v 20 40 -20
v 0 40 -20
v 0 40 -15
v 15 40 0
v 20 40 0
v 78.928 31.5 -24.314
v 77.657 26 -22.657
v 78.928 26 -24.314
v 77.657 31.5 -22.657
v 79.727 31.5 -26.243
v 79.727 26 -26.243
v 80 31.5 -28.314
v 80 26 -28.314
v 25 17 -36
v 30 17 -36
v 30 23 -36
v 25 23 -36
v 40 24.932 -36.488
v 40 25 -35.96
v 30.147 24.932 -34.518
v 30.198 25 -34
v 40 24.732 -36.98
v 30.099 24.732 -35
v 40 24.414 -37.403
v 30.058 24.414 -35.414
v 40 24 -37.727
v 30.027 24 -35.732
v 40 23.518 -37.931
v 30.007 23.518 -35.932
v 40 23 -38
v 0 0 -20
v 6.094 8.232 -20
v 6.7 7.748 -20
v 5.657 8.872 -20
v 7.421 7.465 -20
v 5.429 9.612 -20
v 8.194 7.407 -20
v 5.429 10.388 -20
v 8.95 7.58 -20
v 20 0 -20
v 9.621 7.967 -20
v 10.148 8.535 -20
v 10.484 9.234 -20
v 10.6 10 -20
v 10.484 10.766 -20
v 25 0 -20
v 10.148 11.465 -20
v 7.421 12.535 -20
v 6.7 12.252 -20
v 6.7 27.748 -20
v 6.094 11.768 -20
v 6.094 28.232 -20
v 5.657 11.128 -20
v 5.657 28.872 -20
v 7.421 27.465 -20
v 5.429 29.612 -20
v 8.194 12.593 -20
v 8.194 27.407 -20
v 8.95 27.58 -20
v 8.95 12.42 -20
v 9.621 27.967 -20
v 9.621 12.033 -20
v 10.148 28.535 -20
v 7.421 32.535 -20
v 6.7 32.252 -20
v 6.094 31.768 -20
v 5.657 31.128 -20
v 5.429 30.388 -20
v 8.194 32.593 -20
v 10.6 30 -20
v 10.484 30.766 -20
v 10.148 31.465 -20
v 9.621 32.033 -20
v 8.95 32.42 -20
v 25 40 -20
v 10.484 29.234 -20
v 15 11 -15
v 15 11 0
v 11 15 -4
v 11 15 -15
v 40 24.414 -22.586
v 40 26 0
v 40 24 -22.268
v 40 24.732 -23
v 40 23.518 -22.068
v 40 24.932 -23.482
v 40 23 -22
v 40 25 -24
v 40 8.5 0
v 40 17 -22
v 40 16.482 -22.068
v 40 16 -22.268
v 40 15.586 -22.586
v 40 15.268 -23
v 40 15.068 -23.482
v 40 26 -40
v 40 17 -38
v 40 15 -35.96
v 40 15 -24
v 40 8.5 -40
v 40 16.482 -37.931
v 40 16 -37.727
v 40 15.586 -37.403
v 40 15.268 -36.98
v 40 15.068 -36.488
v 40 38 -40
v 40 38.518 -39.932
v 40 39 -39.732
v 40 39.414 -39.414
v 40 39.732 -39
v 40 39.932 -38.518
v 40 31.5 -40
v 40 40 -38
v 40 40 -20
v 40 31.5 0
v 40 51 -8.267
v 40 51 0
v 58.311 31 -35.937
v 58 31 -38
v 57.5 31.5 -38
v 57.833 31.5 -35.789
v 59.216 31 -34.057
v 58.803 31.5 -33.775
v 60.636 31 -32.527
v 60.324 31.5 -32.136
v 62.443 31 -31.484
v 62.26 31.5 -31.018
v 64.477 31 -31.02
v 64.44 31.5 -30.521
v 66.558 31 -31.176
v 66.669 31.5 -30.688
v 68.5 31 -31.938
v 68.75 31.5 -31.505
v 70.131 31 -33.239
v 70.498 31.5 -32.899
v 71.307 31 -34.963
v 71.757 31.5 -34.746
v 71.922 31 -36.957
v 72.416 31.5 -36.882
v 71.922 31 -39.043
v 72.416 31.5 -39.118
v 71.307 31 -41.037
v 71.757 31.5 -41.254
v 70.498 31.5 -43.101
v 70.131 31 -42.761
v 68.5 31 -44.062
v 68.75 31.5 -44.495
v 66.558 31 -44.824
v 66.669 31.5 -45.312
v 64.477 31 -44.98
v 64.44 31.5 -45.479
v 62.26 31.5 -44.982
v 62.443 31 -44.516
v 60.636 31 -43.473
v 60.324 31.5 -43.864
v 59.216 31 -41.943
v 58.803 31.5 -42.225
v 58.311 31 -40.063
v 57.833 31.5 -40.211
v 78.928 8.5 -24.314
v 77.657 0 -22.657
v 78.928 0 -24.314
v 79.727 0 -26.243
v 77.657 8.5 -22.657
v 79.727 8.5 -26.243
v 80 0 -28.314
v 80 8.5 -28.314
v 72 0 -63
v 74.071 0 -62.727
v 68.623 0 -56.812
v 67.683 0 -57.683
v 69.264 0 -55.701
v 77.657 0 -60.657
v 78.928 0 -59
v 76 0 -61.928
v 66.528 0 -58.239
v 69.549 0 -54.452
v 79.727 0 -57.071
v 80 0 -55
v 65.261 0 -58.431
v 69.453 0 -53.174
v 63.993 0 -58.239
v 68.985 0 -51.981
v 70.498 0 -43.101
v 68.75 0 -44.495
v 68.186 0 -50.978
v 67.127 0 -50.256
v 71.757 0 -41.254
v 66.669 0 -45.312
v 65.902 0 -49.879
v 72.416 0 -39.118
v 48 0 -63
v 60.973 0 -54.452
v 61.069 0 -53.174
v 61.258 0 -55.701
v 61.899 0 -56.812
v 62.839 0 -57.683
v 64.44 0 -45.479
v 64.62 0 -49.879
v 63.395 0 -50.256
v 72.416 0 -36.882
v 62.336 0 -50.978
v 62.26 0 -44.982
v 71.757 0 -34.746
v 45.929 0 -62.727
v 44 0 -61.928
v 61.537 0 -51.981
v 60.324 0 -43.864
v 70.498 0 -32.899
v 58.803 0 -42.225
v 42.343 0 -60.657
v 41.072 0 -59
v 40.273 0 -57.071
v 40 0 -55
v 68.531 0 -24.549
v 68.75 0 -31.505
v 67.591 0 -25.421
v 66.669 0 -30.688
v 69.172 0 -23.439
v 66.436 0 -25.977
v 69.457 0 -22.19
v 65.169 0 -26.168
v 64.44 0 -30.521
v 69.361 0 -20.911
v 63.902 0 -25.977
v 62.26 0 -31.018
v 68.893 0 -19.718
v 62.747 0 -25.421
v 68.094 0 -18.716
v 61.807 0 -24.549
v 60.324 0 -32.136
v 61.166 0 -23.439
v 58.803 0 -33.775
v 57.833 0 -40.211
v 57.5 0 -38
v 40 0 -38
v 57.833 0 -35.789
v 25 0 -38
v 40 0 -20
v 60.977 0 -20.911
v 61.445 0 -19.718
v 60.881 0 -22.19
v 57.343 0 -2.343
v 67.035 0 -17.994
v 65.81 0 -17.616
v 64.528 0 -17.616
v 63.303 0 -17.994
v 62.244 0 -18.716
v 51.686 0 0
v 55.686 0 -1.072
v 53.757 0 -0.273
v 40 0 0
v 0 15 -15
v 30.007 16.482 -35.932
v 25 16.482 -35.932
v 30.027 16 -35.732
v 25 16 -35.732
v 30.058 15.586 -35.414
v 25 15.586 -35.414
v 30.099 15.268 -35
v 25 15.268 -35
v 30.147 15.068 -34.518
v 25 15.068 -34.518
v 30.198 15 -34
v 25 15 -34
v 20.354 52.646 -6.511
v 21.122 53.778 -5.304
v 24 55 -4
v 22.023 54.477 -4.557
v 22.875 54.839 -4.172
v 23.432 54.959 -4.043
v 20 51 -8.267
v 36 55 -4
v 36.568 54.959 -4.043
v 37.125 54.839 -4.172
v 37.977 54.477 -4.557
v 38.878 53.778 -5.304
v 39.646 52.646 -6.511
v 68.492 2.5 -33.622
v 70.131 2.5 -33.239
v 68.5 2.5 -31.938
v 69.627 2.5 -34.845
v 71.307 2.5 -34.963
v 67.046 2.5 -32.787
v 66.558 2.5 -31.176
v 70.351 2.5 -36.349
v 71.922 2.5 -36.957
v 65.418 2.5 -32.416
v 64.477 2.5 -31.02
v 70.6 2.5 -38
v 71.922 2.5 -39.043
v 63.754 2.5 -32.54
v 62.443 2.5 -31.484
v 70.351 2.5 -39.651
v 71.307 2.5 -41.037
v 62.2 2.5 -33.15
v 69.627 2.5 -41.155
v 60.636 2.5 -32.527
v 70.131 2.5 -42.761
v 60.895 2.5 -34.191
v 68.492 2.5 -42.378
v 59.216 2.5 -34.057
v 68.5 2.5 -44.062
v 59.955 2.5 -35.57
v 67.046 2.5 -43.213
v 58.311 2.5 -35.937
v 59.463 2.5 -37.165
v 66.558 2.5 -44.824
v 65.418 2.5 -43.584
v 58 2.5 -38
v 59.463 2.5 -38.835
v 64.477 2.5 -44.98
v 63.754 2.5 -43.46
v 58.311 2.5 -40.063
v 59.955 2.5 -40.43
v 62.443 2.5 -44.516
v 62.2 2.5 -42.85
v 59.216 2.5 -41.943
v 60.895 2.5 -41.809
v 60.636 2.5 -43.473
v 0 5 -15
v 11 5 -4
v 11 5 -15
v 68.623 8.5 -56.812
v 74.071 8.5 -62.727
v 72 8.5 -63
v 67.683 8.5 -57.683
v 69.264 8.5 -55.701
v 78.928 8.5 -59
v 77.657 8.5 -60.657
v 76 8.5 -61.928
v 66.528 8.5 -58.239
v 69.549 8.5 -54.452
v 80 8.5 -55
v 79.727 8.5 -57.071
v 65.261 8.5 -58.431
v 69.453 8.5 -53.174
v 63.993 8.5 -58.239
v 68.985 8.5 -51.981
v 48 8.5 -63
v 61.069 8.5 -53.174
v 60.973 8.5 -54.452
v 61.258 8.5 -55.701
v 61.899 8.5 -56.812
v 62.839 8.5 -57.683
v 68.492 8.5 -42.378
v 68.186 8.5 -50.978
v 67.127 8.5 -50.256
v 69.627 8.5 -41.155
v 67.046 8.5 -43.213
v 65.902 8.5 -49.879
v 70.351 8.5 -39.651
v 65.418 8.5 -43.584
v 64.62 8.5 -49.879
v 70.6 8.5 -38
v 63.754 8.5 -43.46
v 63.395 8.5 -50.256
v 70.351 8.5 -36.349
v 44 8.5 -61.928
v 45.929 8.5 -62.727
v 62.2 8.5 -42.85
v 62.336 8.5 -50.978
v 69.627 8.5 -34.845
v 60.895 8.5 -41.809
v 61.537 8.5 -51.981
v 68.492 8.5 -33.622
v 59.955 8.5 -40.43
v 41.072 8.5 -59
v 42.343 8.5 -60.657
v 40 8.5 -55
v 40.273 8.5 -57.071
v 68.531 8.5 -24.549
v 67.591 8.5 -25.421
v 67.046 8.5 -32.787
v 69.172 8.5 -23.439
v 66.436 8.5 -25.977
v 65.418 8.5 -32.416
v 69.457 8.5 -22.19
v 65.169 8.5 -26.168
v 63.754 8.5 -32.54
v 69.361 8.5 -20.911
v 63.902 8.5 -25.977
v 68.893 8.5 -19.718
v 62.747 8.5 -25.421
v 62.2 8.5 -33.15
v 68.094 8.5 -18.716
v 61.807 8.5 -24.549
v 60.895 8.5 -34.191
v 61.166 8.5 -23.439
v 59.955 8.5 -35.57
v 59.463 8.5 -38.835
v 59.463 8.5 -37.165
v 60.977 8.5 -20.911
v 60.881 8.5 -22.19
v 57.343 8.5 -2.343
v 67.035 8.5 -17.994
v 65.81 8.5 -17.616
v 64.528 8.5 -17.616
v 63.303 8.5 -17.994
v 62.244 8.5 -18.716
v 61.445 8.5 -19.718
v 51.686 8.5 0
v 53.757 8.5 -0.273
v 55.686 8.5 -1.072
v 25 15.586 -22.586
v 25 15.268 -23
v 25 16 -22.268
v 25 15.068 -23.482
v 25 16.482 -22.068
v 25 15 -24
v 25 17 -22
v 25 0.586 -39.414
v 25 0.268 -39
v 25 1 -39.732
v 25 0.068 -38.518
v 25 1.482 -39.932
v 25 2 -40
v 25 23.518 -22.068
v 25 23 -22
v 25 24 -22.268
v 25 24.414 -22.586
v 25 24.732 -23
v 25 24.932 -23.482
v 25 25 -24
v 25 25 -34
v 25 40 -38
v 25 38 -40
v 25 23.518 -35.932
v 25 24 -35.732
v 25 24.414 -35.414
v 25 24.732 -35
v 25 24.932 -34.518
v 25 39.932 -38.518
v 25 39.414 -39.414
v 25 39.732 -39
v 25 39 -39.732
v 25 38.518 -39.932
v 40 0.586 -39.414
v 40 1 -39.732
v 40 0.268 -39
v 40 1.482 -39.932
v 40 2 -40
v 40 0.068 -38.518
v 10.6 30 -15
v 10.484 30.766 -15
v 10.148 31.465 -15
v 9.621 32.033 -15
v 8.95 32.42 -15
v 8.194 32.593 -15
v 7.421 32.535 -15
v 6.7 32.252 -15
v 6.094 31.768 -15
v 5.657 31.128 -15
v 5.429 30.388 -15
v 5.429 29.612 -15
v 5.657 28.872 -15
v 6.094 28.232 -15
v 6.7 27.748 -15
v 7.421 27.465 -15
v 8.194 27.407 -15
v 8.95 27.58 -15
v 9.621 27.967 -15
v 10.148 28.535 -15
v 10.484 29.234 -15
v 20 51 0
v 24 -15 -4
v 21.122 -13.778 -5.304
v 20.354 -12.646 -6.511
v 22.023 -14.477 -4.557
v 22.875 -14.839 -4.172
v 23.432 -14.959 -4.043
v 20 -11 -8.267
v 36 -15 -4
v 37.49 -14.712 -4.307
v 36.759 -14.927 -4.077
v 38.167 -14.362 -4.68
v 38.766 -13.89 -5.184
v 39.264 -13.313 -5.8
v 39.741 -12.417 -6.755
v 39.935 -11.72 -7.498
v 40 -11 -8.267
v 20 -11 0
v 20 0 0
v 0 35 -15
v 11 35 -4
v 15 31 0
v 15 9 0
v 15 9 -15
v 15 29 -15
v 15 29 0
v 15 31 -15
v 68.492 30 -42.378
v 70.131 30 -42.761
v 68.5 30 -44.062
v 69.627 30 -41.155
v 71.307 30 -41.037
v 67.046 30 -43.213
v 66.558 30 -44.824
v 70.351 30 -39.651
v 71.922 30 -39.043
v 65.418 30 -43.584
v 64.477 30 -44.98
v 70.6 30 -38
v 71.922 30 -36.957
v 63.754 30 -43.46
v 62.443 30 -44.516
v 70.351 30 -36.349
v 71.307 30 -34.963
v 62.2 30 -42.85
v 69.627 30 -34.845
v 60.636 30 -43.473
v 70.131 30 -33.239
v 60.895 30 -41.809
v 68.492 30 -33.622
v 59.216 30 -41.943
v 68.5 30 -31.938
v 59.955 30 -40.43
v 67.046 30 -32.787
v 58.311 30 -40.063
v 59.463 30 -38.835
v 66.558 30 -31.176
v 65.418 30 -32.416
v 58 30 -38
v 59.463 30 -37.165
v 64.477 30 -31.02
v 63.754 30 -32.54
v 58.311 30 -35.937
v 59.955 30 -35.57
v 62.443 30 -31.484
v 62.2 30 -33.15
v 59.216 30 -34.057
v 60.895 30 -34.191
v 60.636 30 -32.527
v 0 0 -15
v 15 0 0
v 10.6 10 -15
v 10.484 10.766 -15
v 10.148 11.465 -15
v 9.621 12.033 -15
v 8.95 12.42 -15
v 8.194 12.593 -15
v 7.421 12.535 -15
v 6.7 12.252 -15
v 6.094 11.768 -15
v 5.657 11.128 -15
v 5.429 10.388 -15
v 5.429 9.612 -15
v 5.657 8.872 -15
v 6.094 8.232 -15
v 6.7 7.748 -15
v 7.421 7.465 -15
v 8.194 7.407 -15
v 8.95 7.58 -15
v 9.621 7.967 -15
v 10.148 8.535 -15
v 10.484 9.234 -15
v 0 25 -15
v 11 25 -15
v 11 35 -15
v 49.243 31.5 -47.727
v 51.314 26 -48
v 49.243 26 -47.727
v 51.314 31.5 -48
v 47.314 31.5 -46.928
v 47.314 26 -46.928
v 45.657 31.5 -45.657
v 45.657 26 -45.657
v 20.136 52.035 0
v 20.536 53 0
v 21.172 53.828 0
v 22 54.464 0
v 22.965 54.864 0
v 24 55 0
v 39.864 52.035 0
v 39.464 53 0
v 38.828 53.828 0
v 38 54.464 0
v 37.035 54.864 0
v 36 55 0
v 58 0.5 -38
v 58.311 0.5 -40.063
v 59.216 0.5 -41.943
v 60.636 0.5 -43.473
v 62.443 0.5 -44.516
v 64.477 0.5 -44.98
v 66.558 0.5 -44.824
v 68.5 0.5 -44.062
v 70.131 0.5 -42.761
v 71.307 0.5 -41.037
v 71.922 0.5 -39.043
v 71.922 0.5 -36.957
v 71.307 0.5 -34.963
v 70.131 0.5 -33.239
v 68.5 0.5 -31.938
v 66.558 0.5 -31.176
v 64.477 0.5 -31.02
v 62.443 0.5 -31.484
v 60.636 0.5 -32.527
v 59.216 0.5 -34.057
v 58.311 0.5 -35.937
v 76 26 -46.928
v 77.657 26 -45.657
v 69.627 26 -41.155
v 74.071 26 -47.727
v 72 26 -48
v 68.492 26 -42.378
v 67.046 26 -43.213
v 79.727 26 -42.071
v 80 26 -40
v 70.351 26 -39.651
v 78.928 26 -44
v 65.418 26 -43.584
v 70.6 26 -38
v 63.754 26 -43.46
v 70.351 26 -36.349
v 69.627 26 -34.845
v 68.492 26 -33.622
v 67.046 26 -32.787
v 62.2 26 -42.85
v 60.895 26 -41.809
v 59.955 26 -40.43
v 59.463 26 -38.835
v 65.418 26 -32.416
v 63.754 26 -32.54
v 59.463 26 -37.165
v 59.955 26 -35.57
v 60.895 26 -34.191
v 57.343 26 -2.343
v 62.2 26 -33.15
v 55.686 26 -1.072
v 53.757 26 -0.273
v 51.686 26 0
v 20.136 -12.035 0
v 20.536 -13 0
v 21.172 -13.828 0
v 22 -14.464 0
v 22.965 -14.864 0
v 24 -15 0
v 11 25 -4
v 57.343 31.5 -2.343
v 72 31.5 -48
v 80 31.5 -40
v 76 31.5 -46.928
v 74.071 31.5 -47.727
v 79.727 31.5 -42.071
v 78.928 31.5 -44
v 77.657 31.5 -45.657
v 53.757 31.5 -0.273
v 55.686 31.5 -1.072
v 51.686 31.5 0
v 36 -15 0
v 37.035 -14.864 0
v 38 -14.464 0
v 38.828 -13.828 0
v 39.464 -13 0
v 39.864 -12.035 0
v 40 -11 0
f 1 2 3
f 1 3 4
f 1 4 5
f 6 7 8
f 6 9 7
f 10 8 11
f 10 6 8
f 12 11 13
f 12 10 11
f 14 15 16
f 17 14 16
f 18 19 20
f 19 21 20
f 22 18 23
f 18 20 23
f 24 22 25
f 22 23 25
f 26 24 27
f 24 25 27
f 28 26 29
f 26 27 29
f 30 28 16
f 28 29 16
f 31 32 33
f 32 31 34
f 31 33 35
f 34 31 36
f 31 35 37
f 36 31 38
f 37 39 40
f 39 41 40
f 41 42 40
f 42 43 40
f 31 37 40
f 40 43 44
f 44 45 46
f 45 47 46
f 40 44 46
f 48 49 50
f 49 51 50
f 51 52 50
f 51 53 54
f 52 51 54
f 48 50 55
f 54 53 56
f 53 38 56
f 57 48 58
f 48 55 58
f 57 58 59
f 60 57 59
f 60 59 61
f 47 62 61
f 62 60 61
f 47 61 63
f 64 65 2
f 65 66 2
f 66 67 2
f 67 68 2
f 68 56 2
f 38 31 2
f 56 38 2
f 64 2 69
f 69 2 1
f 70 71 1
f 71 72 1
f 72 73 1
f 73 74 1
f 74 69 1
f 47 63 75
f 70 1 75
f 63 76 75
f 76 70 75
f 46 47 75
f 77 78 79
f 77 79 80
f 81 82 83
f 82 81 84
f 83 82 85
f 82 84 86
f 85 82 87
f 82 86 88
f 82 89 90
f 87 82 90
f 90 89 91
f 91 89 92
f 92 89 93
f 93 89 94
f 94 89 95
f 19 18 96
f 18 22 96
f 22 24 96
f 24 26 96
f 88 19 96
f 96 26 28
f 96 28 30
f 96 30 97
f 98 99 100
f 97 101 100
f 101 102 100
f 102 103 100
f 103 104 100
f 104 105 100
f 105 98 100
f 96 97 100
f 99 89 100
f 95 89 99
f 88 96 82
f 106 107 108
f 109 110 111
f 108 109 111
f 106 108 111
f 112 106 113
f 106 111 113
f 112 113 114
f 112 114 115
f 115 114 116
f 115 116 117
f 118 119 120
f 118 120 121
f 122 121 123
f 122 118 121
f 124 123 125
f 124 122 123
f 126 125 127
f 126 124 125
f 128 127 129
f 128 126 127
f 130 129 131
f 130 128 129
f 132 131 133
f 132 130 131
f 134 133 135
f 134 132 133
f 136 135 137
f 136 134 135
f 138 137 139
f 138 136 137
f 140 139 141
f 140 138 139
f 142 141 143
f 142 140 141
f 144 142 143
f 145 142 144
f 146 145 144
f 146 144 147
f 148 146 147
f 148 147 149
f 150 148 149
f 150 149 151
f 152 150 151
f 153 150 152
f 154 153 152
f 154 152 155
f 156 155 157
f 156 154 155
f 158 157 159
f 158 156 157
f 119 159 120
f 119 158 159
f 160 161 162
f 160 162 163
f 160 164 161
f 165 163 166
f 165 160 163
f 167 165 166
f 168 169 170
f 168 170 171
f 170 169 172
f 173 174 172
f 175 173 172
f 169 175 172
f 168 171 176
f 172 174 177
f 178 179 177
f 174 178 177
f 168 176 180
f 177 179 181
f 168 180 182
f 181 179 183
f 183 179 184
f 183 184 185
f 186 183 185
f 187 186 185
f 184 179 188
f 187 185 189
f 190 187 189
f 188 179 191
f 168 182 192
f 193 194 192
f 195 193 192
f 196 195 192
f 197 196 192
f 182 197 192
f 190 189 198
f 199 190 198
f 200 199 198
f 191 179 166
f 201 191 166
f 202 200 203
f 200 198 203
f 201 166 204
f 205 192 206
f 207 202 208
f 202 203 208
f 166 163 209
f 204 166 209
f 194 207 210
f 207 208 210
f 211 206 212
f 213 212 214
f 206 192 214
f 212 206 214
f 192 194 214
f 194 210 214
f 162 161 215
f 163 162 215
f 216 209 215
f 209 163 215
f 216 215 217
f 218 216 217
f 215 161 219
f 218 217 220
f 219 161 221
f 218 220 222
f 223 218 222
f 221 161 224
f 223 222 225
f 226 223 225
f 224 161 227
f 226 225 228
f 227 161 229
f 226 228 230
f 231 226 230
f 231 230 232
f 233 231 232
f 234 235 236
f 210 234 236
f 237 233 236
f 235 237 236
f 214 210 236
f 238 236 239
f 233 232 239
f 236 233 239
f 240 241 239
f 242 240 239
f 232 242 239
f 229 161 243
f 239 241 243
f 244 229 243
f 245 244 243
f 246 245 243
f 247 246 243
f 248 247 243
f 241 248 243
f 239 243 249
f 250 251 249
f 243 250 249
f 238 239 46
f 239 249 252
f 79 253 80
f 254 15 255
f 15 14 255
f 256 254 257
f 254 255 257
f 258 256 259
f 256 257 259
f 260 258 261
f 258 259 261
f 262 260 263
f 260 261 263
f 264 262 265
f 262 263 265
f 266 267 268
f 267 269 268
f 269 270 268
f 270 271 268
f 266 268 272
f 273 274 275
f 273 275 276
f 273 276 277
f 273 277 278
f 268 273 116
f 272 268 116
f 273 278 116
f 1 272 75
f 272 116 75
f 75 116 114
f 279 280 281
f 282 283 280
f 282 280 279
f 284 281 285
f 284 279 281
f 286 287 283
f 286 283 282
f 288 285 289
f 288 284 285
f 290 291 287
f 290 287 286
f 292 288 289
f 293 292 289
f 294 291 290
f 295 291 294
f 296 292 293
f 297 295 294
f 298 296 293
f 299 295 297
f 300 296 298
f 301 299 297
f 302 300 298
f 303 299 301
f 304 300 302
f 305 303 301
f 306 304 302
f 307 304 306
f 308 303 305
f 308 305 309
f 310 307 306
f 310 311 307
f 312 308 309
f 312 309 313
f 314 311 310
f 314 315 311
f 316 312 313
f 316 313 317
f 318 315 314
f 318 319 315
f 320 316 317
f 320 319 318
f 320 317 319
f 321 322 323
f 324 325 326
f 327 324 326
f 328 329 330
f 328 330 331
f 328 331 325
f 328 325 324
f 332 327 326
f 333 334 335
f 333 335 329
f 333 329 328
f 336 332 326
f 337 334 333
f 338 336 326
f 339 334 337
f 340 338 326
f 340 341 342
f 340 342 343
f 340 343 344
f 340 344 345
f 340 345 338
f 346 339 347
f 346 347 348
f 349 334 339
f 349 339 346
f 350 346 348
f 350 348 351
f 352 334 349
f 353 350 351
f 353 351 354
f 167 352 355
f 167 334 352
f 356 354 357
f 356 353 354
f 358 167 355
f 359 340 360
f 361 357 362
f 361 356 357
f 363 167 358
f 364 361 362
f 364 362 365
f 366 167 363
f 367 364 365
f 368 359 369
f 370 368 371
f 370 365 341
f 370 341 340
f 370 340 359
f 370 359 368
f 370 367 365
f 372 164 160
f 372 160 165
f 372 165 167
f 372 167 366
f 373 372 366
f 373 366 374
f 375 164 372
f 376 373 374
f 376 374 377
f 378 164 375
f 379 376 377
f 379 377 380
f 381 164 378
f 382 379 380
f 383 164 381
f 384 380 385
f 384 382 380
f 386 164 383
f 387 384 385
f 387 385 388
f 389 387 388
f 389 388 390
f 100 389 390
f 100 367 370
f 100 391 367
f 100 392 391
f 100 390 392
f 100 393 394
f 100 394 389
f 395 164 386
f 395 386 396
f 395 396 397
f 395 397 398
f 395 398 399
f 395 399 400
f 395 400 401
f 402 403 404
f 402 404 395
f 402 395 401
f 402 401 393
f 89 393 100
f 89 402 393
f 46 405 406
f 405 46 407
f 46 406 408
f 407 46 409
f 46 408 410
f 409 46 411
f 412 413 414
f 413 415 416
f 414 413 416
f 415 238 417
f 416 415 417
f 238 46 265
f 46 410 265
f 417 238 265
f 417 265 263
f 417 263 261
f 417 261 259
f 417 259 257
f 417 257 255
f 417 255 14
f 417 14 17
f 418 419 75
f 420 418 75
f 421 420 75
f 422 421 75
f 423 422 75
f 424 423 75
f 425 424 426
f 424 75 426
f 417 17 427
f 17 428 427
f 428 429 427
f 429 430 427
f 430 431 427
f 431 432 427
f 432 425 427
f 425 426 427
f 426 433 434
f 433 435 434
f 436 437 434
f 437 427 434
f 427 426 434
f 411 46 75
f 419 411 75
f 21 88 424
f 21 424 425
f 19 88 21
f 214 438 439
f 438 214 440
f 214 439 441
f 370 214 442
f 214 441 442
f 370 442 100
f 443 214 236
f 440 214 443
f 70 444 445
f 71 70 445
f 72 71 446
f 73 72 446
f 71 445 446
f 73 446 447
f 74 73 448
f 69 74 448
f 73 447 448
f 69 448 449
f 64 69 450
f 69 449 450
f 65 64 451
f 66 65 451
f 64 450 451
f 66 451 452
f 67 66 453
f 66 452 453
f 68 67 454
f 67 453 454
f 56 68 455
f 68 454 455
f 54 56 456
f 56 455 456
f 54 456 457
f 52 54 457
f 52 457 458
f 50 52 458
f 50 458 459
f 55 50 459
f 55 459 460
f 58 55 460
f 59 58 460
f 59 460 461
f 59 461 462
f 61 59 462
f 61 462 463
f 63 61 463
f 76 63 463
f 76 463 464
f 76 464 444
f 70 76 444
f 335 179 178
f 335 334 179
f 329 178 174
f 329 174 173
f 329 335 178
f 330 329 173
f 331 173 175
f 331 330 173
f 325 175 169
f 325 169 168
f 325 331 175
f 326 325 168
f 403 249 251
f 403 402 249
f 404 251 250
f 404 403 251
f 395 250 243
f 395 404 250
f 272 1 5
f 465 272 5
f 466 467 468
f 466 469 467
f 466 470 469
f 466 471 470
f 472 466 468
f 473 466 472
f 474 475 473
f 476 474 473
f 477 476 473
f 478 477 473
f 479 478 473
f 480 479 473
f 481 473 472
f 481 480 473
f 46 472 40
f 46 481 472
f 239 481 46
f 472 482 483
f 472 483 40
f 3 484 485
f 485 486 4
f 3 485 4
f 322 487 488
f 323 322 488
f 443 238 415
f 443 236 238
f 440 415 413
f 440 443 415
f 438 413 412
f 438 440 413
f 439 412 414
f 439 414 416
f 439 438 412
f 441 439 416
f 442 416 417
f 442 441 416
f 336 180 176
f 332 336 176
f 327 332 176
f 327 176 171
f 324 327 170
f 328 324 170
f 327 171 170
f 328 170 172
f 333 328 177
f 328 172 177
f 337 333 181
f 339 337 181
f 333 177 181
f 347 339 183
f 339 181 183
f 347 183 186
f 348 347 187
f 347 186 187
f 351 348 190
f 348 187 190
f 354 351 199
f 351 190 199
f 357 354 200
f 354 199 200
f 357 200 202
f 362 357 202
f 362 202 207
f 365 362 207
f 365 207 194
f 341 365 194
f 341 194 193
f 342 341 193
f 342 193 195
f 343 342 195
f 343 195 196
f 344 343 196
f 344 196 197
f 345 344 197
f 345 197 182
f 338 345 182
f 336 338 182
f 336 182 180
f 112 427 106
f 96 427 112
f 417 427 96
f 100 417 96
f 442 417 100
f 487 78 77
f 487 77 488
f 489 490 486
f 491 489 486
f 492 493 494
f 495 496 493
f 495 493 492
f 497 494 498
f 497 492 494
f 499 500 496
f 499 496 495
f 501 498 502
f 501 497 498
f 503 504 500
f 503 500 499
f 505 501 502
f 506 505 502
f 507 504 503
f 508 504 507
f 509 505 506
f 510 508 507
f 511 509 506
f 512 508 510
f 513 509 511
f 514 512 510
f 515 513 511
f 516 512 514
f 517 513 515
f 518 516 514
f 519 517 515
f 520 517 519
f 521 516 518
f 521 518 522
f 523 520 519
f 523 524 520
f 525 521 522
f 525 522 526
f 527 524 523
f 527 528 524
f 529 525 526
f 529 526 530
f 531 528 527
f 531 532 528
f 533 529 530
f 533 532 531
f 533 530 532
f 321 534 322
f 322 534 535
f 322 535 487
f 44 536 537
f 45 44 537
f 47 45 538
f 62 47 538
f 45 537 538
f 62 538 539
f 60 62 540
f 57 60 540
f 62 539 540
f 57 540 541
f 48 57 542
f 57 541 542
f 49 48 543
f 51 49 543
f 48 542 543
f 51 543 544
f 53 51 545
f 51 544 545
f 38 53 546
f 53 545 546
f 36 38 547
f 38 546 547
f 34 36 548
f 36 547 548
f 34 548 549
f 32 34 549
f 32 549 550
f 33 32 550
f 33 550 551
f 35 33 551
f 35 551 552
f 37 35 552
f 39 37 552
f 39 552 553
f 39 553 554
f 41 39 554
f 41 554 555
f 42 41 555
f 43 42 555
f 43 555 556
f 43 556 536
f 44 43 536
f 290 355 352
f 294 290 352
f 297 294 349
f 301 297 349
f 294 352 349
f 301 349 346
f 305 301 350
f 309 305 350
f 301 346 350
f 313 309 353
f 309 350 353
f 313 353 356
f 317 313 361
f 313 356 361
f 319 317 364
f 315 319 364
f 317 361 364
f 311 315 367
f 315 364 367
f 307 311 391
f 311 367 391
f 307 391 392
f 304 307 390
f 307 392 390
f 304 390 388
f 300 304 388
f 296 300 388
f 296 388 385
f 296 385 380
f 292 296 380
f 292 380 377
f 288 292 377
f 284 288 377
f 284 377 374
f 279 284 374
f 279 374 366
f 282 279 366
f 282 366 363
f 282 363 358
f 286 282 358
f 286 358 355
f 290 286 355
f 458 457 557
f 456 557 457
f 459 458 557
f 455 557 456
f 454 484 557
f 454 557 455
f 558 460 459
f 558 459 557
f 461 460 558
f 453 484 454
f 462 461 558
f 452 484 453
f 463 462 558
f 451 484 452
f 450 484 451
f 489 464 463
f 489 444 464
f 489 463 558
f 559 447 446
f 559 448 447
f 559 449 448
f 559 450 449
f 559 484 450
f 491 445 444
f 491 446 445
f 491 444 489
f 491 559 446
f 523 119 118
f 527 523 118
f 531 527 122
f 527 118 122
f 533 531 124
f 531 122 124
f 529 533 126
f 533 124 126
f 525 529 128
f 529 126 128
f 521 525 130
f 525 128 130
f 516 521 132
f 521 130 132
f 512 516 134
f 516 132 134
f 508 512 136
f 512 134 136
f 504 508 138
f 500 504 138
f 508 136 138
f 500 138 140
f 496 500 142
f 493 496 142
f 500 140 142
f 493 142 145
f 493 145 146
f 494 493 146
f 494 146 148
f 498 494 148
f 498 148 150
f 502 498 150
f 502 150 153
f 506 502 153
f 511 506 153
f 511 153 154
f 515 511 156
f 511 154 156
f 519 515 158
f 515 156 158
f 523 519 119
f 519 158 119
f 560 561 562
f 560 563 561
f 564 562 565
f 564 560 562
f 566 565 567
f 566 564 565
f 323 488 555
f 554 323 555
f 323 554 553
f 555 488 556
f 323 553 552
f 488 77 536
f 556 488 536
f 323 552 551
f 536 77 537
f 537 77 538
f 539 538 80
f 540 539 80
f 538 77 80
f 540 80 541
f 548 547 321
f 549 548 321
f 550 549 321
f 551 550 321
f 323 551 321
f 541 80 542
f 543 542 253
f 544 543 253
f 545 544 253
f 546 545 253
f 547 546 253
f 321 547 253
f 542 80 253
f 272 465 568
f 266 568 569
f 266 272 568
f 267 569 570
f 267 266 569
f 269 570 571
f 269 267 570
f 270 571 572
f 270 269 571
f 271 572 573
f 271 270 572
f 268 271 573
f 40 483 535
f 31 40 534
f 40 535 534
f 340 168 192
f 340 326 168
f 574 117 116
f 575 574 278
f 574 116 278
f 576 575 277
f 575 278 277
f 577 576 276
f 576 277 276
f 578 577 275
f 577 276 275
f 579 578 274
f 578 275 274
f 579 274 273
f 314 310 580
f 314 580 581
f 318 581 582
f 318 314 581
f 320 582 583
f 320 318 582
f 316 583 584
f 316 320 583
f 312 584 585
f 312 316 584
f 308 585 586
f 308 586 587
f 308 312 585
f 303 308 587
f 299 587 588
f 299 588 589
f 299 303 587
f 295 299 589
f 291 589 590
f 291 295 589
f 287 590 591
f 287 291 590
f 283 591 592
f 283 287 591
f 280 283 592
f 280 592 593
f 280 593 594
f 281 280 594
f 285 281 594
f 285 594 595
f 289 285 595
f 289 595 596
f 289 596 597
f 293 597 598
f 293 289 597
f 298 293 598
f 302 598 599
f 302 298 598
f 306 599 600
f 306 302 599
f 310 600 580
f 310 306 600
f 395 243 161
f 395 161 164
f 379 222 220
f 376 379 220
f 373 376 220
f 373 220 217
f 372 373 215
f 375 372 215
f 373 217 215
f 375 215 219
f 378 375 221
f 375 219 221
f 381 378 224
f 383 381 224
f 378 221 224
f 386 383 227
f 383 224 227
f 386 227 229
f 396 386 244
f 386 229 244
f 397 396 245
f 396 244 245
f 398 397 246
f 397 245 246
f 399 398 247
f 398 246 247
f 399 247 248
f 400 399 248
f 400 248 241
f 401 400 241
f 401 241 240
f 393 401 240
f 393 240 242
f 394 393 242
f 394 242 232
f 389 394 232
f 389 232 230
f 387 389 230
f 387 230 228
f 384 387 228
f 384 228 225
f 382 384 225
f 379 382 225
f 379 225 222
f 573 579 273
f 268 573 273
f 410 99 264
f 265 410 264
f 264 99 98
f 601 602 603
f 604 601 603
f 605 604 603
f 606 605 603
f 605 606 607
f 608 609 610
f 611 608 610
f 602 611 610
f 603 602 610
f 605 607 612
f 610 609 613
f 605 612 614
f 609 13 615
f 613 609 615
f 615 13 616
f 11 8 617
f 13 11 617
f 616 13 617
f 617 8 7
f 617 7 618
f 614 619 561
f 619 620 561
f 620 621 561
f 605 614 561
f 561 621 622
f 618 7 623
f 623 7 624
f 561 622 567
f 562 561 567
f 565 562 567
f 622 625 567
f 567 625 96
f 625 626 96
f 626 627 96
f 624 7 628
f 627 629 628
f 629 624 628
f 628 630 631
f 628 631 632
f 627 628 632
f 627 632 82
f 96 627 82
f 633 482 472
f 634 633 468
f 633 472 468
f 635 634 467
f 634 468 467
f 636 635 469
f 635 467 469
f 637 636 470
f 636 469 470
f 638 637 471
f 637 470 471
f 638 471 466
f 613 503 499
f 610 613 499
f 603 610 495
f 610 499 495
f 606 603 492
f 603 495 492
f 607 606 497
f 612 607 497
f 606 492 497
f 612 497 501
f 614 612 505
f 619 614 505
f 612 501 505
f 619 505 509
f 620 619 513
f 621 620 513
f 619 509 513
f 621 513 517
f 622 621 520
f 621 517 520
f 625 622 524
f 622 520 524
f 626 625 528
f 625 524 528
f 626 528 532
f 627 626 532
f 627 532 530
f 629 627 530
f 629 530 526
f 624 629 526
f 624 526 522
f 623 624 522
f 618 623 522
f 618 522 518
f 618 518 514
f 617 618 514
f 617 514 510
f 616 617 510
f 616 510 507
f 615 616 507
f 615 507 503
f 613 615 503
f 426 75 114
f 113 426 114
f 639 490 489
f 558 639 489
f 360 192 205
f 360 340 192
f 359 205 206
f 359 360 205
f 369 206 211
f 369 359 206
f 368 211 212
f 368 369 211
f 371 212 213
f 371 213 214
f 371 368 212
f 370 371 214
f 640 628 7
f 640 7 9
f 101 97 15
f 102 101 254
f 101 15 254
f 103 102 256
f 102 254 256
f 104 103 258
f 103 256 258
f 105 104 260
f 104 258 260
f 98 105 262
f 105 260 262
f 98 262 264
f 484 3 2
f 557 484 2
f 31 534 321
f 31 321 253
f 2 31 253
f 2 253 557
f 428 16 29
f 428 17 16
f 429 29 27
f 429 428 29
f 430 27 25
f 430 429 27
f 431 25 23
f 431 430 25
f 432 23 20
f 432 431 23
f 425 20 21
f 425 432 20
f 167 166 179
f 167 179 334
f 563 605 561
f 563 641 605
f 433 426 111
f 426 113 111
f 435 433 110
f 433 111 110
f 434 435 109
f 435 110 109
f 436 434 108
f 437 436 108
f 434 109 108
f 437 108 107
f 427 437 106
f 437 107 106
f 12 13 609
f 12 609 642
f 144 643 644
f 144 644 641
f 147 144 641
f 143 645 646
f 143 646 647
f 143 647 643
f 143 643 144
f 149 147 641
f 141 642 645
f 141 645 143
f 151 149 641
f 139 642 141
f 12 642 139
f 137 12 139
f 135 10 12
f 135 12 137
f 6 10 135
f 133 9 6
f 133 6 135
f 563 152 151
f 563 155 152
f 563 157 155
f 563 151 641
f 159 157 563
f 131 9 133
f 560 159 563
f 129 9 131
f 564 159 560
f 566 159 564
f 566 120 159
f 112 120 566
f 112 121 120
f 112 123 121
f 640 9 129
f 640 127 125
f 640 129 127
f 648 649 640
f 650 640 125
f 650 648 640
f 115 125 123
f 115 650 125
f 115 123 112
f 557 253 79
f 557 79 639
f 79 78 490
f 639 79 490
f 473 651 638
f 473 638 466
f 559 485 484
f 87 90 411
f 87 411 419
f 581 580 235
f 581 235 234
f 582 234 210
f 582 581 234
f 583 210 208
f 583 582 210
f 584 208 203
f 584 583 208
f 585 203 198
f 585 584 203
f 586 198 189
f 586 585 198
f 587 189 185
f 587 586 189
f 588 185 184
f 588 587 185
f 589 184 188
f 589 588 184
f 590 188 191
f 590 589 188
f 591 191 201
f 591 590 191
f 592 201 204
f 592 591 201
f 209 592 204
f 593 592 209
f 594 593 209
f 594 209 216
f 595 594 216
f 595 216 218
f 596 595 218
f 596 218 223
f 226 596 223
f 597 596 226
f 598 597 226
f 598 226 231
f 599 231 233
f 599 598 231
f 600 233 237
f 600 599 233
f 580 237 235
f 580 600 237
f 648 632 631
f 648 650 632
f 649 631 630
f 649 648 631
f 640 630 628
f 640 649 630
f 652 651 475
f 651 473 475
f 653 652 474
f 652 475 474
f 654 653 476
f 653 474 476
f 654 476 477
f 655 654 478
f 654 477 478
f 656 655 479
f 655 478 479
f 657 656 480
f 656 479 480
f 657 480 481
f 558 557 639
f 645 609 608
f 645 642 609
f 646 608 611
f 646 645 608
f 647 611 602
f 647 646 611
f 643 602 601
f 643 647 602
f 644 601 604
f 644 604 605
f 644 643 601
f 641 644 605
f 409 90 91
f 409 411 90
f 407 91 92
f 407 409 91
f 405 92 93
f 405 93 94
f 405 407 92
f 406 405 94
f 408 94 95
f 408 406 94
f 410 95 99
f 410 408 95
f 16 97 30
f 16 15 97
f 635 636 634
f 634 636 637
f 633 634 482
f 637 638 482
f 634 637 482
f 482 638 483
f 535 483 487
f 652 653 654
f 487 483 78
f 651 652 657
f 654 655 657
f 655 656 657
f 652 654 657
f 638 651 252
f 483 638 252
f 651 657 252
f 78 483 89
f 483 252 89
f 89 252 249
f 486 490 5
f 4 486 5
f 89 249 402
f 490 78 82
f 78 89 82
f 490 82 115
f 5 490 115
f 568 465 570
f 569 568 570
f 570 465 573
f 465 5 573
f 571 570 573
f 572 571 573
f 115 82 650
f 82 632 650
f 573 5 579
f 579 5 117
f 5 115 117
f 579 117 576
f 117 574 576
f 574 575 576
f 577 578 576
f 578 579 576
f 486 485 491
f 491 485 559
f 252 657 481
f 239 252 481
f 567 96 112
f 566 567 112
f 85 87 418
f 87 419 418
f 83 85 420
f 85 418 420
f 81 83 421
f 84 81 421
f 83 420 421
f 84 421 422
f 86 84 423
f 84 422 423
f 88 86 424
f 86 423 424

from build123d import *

# Parameters (mm, degrees)
SKETCH1_W                = 40
SKETCH1_H                = 40
BOSS_EXTRUDE1_DEPTH      = 40
SKETCH2_W                = 25
SKETCH2_H                = 20
CUT_EXTRUDE1_DEPTH       = 40
CHAMFER1_SIZE            = 15
CUT_EXTRUDE2_DEPTH       = 15
CHAMFER2_SIZE            = 4
SKETCH4_R                = 2.6
CUT_EXTRUDE3_DEPTH       = 17
BOSS_EXTRUDE2_DEPTH      = 8
BOSS_EXTRUDE2_DEPTH_BACK = 40
SKETCH5_W                = 40
SKETCH5_H                = 8.5
SKETCH5_H_2              = 5.5
SKETCH10_W               = 14
SKETCH10_H               = 10
CUT_EXTRUDE5_DEPTH       = 26
CHAMFER5_SIZE            = 8
SKETCH8_R                = 5.6
CUT_EXTRUDE4_DEPTH       = 34
BOSS_EXTRUDE3_DEPTH      = 20
FILLET3_R                = 4
FILLET4_R                = 2
SKETCH12_R               = 7
CUT_EXTRUDE6_DEPTH       = 1.5
CUT_EXTRUDE7_START       = -2.5
SKETCH13_R               = 7
CUT_EXTRUDE7_DEPTH       = 2.5
CHAMFER7_SIZE            = 25
FILLET6_R                = 8
CHAMFER8_SIZE            = 2
CHAMFER8_SIZE2           = 10
FILLET7_R                = 2
SKETCH14_W               = 40
SKETCH14_H               = 8.5
BOSS_EXTRUDE4_DEPTH      = 15
SKETCH15_R               = 4.3
CUT_EXTRUDE8_DEPTH       = 10
FILLET8_R                = 8
CHAMFER10_SIZE           = 0.5


with BuildPart() as part:
    # Sketch1 → Boss-Extrude1 (new body)
    with BuildSketch(Plane(origin=(0, 0, 0), x_dir=(1, 0, 0), z_dir=(0, 1, 0))):
        with Locations((20, 20)):
            Rectangle(SKETCH1_W, SKETCH1_H)
    extrude(amount=BOSS_EXTRUDE1_DEPTH)

    # Sketch2 → Cut-Extrude1 (cut)
    with BuildSketch(Plane(origin=(0, 40, 0), x_dir=(1, 0, 0), z_dir=(0, 1, 0))):
        with Locations((12.5, 30)):
            Rectangle(SKETCH2_W, SKETCH2_H)
    extrude(amount=-CUT_EXTRUDE1_DEPTH, mode=Mode.SUBTRACT)

    # Chamfer1
    chamfer1_edges = [part.edges().sort_by_distance(p)[0] for p in [
        (0, 20, 0),
    ]]
    chamfer(chamfer1_edges, length=CHAMFER1_SIZE)

    # Sketch3 → Cut-Extrude2 (cut)
    with BuildSketch(Plane.XY):
        Polygon((0, 10), (0, 15), (15, 15), (15, 5), (0, 5), align=None)
        Polygon((0, 30), (0, 25), (15, 25), (15, 35), (0, 35), align=None)
    extrude(amount=-CUT_EXTRUDE2_DEPTH, mode=Mode.SUBTRACT)

    # Chamfer2
    chamfer2_edges = [part.edges().sort_by_distance(p)[0] for p in [
        (15, 35, -7.5),
        (15, 25, -7.5),
        (15, 15, -7.5),
        (15, 5, -7.5),
    ]]
    chamfer(chamfer2_edges, length=CHAMFER2_SIZE)

    # Sketch4 → Cut-Extrude3 (cut)
    with BuildSketch(Plane.XY.offset(-15)):
        with Locations((8, 30)):
            Circle(SKETCH4_R)
        with Locations((8, 10)):
            Circle(SKETCH4_R)
    extrude(amount=-CUT_EXTRUDE3_DEPTH, mode=Mode.SUBTRACT)

    # Sketch5 → Boss-Extrude2 (add, two sides: drawn at the far end of the back side and taken through both)
    with BuildSketch(Plane(origin=(0, 0, -40), x_dir=(-1, 0, 0), z_dir=(0, 0, -1)).offset(-BOSS_EXTRUDE2_DEPTH_BACK)):
        with Locations((-60, 4.25)):
            Rectangle(SKETCH5_W, SKETCH5_H)
        with Locations((-60, 28.75)):
            Rectangle(SKETCH5_W, SKETCH5_H_2)
    extrude(amount=BOSS_EXTRUDE2_DEPTH + BOSS_EXTRUDE2_DEPTH_BACK)

    # Sketch10 → Cut-Extrude5 (cut)
    with BuildSketch(Plane(origin=(40, 0, 0), x_dir=(0, 0, -1), z_dir=(1, 0, 0))):
        with Locations((29, 20)):
            Rectangle(SKETCH10_W, SKETCH10_H)
    extrude(amount=-CUT_EXTRUDE5_DEPTH, mode=Mode.SUBTRACT)

    # Chamfer5
    chamfer5_edges = [part.edges().sort_by_distance(p)[0] for p in [
        (40, 28.75, -48),
    ]]
    chamfer(chamfer5_edges, length=CHAMFER5_SIZE - 0.0001)  # a hair under: the kernel refuses the full size

    # Sketch8 → Cut-Extrude4 (cut)
    with BuildSketch(Plane(origin=(0, 32, 0), x_dir=(1, 0, 0), z_dir=(0, 1, 0))):
        with Locations((65, 38)):
            Circle(SKETCH8_R)
    extrude(amount=-CUT_EXTRUDE4_DEPTH, mode=Mode.SUBTRACT)

    # Sketch9 → Boss-Extrude3 (add)
    with BuildSketch(Plane(origin=(40, 0, 0), x_dir=(0, 0, -1), z_dir=(1, 0, 0))):
        Polygon((0, 40), (0, 55), (4, 55), (20, 40), align=None)
        Polygon((0, 0), (0, -15), (4, -15), (20, 0), align=None)
    extrude(amount=-BOSS_EXTRUDE3_DEPTH)

    # Fillet3
    fillet3_edges = [part.edges().sort_by_distance(p)[0] for p in [
        (20, 55, -2),
        (40, 55, -2),
        (20, -15, -2),
        (40, -15, -2),
    ]]
    fillet(fillet3_edges, radius=FILLET3_R)

    # Fillet4
    fillet4_edges = [part.edges().sort_by_distance(p)[0] for p in [
        (32.5, 40, -40),
        (32.5, 0, -40),
    ]]
    fillet(fillet4_edges, radius=FILLET4_R)

    # Sketch12 → Cut-Extrude6 (cut)
    with BuildSketch(Plane(origin=(0, 31.5, 0), x_dir=(1, 0, 0), z_dir=(0, 1, 0))):
        with Locations(Location((65, 38, 0), (0, 0, 180))):
            Circle(SKETCH12_R)
    extrude(amount=-CUT_EXTRUDE6_DEPTH, mode=Mode.SUBTRACT)

    # Sketch13 → Cut-Extrude7 (cut)
    with BuildSketch(Plane.XZ.offset(CUT_EXTRUDE7_START)):
        with Locations(Location((65, -38, 0), (0, 0, 180))):
            Circle(SKETCH13_R)
    extrude(amount=CUT_EXTRUDE7_DEPTH, mode=Mode.SUBTRACT)

    # Chamfer7
    chamfer7_edges = [part.edges().sort_by_distance(p)[0] for p in [
        (80, 4.25, 0),
        (80, 28.75, 0),
    ]]
    chamfer(chamfer7_edges, length=CHAMFER7_SIZE)

    # Fillet6
    fillet6_edges = [part.edges().sort_by_distance(p)[0] for p in [
        (80, 28.75, -48),
        (47.9999, 28.75, -48),
        (55, 28.75, 0),
        (55, 4.25, 0),
        (80, 4.25, -25),
        (80, 28.75, -25),
    ]]
    fillet(fillet6_edges, radius=FILLET6_R)

    # Chamfer8
    chamfer8_edges = [part.edges().sort_by_distance(p)[0] for p in [
        (40, 20, -36),
    ]]
    chamfer8_side = [part.faces().sort_by_distance(p)[0] for p in [
        (40, 16.5625, -17.75),
    ]]
    chamfer(chamfer8_edges, length=CHAMFER8_SIZE, length2=CHAMFER8_SIZE2, reference=chamfer8_side[0])

    # Fillet7
    fillet7_edges = [part.edges().sort_by_distance(p)[0] for p in [
        (27.5, 15, -36),
        (32.5, 15, -22),
        (32.5, 25, -22),
        (27.5, 25, -36),
        (35, 25, -37),
        (35, 15, -37),
    ]]
    fillet(fillet7_edges, radius=FILLET7_R)

    # Sketch14 → Boss-Extrude4 (add)
    with BuildSketch(Plane(origin=(0, 0, -48), x_dir=(-1, 0, 0), z_dir=(0, 0, -1))):
        with Locations((-60, 4.25)):
            Rectangle(SKETCH14_W, SKETCH14_H)
    extrude(amount=BOSS_EXTRUDE4_DEPTH)

    # Sketch15 → Cut-Extrude8 (cut)
    with BuildSketch(Plane.XZ):
        with Locations(Location((65.260929409, -54.130501699, 0), (0, 0, 270))):
            Circle(SKETCH15_R)
        with Locations(Location((65.16900186, -21.868239994, 0), (0, 0, 270))):
            Circle(SKETCH15_R)
    extrude(amount=-CUT_EXTRUDE8_DEPTH, mode=Mode.SUBTRACT)

    # Fillet8
    fillet8_edges = [part.edges().sort_by_distance(p)[0] for p in [
        (80, 4.25, -63),
        (40, 4.25, -63),
    ]]
    fillet(fillet8_edges, radius=FILLET8_R)

    # Chamfer10
    chamfer10_edges = [part.edges().sort_by_distance(p)[0] for p in [
        (72, 31.5, -38),
        (72, 0, -38),
    ]]
    chamfer(chamfer10_edges, length=CHAMFER10_SIZE)


solid = part.part
